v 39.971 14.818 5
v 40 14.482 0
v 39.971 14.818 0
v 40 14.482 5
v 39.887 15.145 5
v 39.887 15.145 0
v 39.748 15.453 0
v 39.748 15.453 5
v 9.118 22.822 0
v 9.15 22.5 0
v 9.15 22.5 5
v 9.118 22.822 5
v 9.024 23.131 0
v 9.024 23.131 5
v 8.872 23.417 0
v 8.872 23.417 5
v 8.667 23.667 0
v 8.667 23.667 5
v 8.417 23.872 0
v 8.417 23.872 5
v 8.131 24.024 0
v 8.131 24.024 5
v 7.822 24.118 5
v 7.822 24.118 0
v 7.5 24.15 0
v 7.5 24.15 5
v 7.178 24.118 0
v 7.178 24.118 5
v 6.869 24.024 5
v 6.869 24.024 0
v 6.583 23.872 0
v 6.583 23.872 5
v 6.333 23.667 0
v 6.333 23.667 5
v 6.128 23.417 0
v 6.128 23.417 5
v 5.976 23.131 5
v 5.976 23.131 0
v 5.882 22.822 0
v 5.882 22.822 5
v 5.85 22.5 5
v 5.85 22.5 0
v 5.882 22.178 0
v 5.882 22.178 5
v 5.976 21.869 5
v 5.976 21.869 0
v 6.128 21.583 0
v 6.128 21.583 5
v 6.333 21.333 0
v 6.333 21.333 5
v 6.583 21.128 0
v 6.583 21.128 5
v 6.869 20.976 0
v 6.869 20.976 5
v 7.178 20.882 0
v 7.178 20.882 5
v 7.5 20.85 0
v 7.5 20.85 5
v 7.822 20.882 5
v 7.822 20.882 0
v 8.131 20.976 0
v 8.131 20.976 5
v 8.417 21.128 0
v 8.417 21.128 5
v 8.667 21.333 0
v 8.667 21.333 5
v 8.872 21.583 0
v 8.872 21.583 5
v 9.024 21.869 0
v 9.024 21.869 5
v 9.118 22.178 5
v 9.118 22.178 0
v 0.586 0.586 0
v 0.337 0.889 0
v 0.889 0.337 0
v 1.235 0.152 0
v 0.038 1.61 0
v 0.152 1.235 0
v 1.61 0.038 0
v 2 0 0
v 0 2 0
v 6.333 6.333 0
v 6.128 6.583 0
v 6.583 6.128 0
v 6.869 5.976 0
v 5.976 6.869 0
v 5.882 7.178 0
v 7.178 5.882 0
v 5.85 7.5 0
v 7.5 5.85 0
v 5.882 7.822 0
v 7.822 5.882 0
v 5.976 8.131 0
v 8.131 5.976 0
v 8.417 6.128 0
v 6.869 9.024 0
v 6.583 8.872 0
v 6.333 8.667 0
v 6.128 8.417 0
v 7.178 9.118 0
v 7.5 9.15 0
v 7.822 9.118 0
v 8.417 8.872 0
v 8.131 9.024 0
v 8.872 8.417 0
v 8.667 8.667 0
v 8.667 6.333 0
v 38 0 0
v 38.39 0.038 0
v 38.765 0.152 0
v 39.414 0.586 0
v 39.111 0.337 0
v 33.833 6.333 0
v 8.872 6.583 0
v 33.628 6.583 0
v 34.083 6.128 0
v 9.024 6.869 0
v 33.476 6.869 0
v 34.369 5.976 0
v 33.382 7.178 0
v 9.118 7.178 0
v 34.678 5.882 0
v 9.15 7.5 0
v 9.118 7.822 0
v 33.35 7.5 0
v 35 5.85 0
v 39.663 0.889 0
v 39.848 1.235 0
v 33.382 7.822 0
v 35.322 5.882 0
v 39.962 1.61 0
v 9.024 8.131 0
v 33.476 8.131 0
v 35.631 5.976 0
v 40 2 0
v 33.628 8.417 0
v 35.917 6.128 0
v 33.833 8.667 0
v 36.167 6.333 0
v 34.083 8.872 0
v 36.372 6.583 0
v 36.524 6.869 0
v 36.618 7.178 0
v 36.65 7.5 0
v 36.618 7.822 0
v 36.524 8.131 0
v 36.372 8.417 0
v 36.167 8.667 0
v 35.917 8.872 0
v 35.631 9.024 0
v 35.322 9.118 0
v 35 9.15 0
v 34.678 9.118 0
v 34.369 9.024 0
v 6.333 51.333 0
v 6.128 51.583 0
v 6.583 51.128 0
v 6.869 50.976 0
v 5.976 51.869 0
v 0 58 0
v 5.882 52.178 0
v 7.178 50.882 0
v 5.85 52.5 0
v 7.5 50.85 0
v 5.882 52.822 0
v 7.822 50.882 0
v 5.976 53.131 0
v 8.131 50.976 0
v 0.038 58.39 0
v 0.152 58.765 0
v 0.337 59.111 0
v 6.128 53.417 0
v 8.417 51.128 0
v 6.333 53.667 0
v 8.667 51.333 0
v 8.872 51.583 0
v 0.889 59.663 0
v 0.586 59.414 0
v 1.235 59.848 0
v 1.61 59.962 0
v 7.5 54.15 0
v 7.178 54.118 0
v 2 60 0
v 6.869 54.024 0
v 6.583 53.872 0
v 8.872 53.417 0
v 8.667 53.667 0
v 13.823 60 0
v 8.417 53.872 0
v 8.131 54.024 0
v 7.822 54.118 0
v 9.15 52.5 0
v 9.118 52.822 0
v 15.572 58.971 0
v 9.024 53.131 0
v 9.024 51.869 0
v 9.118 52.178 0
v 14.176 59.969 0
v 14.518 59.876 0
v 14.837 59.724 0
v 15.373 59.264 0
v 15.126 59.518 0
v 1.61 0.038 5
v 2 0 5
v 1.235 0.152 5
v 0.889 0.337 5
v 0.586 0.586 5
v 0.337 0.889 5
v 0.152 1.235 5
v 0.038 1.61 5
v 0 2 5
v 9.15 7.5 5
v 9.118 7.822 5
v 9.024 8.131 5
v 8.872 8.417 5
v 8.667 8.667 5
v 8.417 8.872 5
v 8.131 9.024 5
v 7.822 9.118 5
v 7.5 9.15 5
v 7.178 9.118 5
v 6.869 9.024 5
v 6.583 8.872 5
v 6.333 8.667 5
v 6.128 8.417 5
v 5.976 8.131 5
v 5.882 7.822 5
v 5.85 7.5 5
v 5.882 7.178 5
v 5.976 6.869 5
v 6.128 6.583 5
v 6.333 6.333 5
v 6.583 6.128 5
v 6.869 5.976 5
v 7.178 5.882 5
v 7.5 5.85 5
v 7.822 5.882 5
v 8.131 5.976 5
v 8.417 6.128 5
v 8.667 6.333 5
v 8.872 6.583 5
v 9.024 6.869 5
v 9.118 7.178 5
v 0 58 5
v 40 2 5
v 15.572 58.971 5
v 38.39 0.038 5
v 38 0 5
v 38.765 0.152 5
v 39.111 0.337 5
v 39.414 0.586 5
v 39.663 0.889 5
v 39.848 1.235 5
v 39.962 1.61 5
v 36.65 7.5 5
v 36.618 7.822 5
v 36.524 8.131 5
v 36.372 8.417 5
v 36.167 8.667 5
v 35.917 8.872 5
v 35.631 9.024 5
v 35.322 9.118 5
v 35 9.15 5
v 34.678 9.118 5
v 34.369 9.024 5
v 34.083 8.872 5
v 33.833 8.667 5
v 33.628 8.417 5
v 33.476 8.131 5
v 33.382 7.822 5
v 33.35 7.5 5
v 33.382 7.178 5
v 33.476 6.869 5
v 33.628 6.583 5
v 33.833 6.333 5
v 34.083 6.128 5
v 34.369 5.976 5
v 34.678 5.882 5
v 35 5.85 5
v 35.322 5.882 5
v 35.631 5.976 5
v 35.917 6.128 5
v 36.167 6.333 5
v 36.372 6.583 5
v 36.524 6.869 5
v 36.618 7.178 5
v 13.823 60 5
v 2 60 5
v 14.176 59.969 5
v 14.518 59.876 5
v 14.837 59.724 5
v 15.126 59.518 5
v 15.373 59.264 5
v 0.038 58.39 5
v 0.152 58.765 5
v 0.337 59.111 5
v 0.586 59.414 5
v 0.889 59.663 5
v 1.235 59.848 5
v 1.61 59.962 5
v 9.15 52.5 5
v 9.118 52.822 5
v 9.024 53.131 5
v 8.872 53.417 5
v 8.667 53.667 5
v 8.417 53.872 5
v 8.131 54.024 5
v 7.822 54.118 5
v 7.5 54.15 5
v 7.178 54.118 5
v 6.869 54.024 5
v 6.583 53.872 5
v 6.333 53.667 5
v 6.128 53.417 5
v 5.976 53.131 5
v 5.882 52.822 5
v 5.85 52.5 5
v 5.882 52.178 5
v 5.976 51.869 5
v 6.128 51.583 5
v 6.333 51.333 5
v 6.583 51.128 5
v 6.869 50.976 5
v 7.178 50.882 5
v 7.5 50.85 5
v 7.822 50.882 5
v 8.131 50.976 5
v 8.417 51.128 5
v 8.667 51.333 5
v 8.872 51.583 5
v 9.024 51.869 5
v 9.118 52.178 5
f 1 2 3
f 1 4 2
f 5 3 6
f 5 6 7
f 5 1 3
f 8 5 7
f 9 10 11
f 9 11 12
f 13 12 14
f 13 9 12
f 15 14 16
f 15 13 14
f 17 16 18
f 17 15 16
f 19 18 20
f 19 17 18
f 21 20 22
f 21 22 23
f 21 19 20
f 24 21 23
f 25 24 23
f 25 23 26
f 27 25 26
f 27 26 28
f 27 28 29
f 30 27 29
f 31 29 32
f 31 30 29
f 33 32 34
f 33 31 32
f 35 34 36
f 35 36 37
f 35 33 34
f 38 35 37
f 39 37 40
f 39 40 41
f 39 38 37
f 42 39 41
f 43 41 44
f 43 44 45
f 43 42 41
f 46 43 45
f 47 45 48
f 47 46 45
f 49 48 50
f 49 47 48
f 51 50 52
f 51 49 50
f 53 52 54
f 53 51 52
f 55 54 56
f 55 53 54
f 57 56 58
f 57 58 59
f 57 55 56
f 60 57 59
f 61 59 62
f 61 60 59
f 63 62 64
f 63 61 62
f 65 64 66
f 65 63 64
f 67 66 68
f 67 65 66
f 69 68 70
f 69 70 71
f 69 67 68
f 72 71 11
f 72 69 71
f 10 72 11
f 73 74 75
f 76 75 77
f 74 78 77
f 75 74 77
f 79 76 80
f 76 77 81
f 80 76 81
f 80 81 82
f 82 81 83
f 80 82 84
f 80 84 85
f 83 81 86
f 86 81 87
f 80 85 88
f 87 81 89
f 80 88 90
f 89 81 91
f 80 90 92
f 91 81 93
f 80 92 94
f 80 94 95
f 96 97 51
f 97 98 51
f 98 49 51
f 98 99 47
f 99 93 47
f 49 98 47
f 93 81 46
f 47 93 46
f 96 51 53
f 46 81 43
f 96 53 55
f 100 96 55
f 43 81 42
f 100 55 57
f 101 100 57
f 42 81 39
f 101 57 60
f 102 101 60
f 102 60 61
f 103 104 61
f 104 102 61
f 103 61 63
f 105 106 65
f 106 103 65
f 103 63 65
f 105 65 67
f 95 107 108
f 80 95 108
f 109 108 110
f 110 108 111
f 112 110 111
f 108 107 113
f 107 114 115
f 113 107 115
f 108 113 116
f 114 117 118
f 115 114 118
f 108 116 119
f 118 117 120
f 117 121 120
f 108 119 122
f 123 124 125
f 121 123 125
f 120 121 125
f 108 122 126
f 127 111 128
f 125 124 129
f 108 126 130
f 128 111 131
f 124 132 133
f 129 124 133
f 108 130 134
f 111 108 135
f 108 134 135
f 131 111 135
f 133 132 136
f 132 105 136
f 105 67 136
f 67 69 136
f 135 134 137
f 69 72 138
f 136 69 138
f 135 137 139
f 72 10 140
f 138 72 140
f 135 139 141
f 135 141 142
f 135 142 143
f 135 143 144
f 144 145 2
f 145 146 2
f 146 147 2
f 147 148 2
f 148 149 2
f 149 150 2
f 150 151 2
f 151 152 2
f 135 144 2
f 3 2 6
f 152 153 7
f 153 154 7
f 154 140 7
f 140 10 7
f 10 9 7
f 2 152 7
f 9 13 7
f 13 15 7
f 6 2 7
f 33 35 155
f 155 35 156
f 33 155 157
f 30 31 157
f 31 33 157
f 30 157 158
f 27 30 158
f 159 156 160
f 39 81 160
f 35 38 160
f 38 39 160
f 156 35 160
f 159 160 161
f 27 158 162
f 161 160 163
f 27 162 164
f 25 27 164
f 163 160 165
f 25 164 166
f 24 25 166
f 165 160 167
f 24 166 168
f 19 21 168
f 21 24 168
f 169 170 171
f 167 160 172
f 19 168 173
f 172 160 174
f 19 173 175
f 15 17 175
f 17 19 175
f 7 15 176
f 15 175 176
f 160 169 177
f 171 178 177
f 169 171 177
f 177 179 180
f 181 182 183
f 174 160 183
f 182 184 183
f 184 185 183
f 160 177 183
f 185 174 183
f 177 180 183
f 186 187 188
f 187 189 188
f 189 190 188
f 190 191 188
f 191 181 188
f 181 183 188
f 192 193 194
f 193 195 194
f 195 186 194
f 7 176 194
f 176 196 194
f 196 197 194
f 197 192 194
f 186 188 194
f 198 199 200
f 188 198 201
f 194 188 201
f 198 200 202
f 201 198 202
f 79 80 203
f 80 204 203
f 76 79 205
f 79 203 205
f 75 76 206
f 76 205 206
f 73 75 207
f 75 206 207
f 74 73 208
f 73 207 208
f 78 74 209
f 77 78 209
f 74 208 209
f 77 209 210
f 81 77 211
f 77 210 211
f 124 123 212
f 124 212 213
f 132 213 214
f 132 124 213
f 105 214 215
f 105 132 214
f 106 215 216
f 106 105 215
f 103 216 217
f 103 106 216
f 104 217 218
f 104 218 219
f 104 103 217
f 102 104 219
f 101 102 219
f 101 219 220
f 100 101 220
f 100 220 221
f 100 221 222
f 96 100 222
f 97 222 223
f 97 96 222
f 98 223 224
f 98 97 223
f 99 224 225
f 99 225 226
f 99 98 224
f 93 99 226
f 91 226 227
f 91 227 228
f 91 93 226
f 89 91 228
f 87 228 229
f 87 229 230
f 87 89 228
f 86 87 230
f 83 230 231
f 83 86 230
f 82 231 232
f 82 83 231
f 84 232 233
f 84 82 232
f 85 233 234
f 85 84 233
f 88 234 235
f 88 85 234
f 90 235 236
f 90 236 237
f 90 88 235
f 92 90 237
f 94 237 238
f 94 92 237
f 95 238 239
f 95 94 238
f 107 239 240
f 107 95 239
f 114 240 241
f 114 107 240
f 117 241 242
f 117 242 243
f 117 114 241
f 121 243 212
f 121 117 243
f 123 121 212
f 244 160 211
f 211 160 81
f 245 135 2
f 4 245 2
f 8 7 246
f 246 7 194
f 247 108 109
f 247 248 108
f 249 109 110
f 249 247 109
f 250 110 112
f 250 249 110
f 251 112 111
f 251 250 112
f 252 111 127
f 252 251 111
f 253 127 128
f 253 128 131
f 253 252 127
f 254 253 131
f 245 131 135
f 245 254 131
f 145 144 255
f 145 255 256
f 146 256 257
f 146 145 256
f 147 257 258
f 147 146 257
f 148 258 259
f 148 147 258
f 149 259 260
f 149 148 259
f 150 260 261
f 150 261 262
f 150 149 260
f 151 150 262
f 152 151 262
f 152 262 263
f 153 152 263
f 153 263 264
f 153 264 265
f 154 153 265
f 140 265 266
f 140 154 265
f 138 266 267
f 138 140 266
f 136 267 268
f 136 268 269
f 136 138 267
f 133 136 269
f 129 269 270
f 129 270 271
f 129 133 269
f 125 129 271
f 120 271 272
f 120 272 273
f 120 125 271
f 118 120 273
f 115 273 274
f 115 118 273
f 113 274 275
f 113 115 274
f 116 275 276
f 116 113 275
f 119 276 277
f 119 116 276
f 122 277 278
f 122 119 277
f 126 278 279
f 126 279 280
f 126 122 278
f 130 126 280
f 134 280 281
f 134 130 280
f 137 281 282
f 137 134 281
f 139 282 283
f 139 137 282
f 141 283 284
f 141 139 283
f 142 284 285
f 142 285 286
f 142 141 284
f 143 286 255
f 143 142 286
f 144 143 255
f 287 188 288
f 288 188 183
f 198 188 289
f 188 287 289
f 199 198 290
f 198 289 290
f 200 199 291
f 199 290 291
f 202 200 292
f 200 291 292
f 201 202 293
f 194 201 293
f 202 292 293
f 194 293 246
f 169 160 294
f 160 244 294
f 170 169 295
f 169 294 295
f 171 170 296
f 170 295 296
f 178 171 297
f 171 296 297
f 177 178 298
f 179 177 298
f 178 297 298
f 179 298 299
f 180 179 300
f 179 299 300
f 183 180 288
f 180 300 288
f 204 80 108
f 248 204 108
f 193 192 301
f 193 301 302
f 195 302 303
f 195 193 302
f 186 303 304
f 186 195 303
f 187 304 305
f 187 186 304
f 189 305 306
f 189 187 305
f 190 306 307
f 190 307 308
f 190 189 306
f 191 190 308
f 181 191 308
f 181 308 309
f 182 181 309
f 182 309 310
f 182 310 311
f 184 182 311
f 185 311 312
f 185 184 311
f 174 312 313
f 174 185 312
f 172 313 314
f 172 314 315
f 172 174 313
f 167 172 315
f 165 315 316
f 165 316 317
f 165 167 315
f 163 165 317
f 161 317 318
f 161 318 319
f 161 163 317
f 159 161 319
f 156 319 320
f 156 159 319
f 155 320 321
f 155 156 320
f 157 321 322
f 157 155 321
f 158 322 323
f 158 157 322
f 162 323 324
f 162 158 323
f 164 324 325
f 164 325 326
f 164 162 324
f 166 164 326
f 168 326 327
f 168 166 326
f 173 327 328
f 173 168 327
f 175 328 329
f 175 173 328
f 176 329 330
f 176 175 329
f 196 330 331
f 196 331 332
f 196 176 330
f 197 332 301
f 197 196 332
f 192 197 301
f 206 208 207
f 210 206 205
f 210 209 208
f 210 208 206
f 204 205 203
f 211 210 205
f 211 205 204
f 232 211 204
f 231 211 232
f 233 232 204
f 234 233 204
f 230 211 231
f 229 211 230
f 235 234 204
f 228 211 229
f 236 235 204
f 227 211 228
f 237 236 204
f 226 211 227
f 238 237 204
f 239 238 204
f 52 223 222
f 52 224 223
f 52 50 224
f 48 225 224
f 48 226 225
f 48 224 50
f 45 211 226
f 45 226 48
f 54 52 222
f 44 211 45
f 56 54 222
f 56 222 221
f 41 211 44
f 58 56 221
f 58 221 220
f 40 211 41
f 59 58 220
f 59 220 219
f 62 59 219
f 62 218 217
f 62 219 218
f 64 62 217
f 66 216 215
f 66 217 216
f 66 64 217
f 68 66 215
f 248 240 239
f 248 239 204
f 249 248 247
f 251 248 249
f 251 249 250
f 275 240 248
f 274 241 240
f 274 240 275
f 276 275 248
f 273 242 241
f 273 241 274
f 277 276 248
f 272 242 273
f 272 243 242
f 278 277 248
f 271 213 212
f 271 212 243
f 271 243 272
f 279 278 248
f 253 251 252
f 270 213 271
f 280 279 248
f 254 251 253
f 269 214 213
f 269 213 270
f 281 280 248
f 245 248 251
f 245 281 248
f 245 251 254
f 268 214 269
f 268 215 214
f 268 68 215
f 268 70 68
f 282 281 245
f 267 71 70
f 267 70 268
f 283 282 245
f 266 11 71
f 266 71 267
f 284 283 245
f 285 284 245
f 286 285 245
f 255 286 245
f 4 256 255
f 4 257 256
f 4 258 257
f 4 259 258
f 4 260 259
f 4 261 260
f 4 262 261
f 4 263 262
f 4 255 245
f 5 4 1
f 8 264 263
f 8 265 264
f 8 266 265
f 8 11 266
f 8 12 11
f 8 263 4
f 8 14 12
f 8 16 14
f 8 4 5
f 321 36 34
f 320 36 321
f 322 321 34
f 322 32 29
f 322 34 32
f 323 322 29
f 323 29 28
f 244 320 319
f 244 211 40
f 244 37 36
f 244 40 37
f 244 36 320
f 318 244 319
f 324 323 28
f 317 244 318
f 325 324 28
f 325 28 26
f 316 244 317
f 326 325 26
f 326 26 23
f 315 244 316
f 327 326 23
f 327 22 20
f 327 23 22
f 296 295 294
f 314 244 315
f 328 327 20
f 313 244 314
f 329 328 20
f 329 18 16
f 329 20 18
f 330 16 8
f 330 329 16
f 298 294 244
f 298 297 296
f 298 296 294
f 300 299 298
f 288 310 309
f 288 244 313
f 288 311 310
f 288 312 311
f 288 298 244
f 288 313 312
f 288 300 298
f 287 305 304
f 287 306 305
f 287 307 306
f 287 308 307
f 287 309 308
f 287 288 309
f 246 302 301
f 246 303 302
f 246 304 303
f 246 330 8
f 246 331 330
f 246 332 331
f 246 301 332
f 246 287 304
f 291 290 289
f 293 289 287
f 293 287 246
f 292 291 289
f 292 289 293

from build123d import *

# Parameters (mm, degrees)
SKETCH_1_R      = 1.65
EXTRUDE_1_DEPTH = 5
FILLET_1_R      = 2


with BuildPart() as part:
    # ｽｹｯﾁ1 → ﾎﾞｽ - 押し出し1 (new body)
    with BuildSketch(Plane.XY):
        Polygon((0, 0), (40, 0), (40, 15), (15, 60), (0, 60), align=None)
        with Locations((35, 7.5)):
            Circle(SKETCH_1_R, mode=Mode.SUBTRACT)
        with Locations((7.5, 7.5)):
            Circle(SKETCH_1_R, mode=Mode.SUBTRACT)
        with Locations((7.5, 22.5)):
            Circle(SKETCH_1_R, mode=Mode.SUBTRACT)
        with Locations((7.5, 52.5)):
            Circle(SKETCH_1_R, mode=Mode.SUBTRACT)
    extrude(amount=EXTRUDE_1_DEPTH)

    # ﾌｨﾚｯﾄ1
    fillet_1_edges = [part.edges().sort_by_distance(p)[0] for p in [
        (0, 60, 2.5),
        (15, 60, 2.5),
        (40, 15, 2.5),
        (40, 0, 2.5),
        (0, 0, 2.5),
    ]]
    fillet(fillet_1_edges, radius=FILLET_1_R)


solid = part.part
